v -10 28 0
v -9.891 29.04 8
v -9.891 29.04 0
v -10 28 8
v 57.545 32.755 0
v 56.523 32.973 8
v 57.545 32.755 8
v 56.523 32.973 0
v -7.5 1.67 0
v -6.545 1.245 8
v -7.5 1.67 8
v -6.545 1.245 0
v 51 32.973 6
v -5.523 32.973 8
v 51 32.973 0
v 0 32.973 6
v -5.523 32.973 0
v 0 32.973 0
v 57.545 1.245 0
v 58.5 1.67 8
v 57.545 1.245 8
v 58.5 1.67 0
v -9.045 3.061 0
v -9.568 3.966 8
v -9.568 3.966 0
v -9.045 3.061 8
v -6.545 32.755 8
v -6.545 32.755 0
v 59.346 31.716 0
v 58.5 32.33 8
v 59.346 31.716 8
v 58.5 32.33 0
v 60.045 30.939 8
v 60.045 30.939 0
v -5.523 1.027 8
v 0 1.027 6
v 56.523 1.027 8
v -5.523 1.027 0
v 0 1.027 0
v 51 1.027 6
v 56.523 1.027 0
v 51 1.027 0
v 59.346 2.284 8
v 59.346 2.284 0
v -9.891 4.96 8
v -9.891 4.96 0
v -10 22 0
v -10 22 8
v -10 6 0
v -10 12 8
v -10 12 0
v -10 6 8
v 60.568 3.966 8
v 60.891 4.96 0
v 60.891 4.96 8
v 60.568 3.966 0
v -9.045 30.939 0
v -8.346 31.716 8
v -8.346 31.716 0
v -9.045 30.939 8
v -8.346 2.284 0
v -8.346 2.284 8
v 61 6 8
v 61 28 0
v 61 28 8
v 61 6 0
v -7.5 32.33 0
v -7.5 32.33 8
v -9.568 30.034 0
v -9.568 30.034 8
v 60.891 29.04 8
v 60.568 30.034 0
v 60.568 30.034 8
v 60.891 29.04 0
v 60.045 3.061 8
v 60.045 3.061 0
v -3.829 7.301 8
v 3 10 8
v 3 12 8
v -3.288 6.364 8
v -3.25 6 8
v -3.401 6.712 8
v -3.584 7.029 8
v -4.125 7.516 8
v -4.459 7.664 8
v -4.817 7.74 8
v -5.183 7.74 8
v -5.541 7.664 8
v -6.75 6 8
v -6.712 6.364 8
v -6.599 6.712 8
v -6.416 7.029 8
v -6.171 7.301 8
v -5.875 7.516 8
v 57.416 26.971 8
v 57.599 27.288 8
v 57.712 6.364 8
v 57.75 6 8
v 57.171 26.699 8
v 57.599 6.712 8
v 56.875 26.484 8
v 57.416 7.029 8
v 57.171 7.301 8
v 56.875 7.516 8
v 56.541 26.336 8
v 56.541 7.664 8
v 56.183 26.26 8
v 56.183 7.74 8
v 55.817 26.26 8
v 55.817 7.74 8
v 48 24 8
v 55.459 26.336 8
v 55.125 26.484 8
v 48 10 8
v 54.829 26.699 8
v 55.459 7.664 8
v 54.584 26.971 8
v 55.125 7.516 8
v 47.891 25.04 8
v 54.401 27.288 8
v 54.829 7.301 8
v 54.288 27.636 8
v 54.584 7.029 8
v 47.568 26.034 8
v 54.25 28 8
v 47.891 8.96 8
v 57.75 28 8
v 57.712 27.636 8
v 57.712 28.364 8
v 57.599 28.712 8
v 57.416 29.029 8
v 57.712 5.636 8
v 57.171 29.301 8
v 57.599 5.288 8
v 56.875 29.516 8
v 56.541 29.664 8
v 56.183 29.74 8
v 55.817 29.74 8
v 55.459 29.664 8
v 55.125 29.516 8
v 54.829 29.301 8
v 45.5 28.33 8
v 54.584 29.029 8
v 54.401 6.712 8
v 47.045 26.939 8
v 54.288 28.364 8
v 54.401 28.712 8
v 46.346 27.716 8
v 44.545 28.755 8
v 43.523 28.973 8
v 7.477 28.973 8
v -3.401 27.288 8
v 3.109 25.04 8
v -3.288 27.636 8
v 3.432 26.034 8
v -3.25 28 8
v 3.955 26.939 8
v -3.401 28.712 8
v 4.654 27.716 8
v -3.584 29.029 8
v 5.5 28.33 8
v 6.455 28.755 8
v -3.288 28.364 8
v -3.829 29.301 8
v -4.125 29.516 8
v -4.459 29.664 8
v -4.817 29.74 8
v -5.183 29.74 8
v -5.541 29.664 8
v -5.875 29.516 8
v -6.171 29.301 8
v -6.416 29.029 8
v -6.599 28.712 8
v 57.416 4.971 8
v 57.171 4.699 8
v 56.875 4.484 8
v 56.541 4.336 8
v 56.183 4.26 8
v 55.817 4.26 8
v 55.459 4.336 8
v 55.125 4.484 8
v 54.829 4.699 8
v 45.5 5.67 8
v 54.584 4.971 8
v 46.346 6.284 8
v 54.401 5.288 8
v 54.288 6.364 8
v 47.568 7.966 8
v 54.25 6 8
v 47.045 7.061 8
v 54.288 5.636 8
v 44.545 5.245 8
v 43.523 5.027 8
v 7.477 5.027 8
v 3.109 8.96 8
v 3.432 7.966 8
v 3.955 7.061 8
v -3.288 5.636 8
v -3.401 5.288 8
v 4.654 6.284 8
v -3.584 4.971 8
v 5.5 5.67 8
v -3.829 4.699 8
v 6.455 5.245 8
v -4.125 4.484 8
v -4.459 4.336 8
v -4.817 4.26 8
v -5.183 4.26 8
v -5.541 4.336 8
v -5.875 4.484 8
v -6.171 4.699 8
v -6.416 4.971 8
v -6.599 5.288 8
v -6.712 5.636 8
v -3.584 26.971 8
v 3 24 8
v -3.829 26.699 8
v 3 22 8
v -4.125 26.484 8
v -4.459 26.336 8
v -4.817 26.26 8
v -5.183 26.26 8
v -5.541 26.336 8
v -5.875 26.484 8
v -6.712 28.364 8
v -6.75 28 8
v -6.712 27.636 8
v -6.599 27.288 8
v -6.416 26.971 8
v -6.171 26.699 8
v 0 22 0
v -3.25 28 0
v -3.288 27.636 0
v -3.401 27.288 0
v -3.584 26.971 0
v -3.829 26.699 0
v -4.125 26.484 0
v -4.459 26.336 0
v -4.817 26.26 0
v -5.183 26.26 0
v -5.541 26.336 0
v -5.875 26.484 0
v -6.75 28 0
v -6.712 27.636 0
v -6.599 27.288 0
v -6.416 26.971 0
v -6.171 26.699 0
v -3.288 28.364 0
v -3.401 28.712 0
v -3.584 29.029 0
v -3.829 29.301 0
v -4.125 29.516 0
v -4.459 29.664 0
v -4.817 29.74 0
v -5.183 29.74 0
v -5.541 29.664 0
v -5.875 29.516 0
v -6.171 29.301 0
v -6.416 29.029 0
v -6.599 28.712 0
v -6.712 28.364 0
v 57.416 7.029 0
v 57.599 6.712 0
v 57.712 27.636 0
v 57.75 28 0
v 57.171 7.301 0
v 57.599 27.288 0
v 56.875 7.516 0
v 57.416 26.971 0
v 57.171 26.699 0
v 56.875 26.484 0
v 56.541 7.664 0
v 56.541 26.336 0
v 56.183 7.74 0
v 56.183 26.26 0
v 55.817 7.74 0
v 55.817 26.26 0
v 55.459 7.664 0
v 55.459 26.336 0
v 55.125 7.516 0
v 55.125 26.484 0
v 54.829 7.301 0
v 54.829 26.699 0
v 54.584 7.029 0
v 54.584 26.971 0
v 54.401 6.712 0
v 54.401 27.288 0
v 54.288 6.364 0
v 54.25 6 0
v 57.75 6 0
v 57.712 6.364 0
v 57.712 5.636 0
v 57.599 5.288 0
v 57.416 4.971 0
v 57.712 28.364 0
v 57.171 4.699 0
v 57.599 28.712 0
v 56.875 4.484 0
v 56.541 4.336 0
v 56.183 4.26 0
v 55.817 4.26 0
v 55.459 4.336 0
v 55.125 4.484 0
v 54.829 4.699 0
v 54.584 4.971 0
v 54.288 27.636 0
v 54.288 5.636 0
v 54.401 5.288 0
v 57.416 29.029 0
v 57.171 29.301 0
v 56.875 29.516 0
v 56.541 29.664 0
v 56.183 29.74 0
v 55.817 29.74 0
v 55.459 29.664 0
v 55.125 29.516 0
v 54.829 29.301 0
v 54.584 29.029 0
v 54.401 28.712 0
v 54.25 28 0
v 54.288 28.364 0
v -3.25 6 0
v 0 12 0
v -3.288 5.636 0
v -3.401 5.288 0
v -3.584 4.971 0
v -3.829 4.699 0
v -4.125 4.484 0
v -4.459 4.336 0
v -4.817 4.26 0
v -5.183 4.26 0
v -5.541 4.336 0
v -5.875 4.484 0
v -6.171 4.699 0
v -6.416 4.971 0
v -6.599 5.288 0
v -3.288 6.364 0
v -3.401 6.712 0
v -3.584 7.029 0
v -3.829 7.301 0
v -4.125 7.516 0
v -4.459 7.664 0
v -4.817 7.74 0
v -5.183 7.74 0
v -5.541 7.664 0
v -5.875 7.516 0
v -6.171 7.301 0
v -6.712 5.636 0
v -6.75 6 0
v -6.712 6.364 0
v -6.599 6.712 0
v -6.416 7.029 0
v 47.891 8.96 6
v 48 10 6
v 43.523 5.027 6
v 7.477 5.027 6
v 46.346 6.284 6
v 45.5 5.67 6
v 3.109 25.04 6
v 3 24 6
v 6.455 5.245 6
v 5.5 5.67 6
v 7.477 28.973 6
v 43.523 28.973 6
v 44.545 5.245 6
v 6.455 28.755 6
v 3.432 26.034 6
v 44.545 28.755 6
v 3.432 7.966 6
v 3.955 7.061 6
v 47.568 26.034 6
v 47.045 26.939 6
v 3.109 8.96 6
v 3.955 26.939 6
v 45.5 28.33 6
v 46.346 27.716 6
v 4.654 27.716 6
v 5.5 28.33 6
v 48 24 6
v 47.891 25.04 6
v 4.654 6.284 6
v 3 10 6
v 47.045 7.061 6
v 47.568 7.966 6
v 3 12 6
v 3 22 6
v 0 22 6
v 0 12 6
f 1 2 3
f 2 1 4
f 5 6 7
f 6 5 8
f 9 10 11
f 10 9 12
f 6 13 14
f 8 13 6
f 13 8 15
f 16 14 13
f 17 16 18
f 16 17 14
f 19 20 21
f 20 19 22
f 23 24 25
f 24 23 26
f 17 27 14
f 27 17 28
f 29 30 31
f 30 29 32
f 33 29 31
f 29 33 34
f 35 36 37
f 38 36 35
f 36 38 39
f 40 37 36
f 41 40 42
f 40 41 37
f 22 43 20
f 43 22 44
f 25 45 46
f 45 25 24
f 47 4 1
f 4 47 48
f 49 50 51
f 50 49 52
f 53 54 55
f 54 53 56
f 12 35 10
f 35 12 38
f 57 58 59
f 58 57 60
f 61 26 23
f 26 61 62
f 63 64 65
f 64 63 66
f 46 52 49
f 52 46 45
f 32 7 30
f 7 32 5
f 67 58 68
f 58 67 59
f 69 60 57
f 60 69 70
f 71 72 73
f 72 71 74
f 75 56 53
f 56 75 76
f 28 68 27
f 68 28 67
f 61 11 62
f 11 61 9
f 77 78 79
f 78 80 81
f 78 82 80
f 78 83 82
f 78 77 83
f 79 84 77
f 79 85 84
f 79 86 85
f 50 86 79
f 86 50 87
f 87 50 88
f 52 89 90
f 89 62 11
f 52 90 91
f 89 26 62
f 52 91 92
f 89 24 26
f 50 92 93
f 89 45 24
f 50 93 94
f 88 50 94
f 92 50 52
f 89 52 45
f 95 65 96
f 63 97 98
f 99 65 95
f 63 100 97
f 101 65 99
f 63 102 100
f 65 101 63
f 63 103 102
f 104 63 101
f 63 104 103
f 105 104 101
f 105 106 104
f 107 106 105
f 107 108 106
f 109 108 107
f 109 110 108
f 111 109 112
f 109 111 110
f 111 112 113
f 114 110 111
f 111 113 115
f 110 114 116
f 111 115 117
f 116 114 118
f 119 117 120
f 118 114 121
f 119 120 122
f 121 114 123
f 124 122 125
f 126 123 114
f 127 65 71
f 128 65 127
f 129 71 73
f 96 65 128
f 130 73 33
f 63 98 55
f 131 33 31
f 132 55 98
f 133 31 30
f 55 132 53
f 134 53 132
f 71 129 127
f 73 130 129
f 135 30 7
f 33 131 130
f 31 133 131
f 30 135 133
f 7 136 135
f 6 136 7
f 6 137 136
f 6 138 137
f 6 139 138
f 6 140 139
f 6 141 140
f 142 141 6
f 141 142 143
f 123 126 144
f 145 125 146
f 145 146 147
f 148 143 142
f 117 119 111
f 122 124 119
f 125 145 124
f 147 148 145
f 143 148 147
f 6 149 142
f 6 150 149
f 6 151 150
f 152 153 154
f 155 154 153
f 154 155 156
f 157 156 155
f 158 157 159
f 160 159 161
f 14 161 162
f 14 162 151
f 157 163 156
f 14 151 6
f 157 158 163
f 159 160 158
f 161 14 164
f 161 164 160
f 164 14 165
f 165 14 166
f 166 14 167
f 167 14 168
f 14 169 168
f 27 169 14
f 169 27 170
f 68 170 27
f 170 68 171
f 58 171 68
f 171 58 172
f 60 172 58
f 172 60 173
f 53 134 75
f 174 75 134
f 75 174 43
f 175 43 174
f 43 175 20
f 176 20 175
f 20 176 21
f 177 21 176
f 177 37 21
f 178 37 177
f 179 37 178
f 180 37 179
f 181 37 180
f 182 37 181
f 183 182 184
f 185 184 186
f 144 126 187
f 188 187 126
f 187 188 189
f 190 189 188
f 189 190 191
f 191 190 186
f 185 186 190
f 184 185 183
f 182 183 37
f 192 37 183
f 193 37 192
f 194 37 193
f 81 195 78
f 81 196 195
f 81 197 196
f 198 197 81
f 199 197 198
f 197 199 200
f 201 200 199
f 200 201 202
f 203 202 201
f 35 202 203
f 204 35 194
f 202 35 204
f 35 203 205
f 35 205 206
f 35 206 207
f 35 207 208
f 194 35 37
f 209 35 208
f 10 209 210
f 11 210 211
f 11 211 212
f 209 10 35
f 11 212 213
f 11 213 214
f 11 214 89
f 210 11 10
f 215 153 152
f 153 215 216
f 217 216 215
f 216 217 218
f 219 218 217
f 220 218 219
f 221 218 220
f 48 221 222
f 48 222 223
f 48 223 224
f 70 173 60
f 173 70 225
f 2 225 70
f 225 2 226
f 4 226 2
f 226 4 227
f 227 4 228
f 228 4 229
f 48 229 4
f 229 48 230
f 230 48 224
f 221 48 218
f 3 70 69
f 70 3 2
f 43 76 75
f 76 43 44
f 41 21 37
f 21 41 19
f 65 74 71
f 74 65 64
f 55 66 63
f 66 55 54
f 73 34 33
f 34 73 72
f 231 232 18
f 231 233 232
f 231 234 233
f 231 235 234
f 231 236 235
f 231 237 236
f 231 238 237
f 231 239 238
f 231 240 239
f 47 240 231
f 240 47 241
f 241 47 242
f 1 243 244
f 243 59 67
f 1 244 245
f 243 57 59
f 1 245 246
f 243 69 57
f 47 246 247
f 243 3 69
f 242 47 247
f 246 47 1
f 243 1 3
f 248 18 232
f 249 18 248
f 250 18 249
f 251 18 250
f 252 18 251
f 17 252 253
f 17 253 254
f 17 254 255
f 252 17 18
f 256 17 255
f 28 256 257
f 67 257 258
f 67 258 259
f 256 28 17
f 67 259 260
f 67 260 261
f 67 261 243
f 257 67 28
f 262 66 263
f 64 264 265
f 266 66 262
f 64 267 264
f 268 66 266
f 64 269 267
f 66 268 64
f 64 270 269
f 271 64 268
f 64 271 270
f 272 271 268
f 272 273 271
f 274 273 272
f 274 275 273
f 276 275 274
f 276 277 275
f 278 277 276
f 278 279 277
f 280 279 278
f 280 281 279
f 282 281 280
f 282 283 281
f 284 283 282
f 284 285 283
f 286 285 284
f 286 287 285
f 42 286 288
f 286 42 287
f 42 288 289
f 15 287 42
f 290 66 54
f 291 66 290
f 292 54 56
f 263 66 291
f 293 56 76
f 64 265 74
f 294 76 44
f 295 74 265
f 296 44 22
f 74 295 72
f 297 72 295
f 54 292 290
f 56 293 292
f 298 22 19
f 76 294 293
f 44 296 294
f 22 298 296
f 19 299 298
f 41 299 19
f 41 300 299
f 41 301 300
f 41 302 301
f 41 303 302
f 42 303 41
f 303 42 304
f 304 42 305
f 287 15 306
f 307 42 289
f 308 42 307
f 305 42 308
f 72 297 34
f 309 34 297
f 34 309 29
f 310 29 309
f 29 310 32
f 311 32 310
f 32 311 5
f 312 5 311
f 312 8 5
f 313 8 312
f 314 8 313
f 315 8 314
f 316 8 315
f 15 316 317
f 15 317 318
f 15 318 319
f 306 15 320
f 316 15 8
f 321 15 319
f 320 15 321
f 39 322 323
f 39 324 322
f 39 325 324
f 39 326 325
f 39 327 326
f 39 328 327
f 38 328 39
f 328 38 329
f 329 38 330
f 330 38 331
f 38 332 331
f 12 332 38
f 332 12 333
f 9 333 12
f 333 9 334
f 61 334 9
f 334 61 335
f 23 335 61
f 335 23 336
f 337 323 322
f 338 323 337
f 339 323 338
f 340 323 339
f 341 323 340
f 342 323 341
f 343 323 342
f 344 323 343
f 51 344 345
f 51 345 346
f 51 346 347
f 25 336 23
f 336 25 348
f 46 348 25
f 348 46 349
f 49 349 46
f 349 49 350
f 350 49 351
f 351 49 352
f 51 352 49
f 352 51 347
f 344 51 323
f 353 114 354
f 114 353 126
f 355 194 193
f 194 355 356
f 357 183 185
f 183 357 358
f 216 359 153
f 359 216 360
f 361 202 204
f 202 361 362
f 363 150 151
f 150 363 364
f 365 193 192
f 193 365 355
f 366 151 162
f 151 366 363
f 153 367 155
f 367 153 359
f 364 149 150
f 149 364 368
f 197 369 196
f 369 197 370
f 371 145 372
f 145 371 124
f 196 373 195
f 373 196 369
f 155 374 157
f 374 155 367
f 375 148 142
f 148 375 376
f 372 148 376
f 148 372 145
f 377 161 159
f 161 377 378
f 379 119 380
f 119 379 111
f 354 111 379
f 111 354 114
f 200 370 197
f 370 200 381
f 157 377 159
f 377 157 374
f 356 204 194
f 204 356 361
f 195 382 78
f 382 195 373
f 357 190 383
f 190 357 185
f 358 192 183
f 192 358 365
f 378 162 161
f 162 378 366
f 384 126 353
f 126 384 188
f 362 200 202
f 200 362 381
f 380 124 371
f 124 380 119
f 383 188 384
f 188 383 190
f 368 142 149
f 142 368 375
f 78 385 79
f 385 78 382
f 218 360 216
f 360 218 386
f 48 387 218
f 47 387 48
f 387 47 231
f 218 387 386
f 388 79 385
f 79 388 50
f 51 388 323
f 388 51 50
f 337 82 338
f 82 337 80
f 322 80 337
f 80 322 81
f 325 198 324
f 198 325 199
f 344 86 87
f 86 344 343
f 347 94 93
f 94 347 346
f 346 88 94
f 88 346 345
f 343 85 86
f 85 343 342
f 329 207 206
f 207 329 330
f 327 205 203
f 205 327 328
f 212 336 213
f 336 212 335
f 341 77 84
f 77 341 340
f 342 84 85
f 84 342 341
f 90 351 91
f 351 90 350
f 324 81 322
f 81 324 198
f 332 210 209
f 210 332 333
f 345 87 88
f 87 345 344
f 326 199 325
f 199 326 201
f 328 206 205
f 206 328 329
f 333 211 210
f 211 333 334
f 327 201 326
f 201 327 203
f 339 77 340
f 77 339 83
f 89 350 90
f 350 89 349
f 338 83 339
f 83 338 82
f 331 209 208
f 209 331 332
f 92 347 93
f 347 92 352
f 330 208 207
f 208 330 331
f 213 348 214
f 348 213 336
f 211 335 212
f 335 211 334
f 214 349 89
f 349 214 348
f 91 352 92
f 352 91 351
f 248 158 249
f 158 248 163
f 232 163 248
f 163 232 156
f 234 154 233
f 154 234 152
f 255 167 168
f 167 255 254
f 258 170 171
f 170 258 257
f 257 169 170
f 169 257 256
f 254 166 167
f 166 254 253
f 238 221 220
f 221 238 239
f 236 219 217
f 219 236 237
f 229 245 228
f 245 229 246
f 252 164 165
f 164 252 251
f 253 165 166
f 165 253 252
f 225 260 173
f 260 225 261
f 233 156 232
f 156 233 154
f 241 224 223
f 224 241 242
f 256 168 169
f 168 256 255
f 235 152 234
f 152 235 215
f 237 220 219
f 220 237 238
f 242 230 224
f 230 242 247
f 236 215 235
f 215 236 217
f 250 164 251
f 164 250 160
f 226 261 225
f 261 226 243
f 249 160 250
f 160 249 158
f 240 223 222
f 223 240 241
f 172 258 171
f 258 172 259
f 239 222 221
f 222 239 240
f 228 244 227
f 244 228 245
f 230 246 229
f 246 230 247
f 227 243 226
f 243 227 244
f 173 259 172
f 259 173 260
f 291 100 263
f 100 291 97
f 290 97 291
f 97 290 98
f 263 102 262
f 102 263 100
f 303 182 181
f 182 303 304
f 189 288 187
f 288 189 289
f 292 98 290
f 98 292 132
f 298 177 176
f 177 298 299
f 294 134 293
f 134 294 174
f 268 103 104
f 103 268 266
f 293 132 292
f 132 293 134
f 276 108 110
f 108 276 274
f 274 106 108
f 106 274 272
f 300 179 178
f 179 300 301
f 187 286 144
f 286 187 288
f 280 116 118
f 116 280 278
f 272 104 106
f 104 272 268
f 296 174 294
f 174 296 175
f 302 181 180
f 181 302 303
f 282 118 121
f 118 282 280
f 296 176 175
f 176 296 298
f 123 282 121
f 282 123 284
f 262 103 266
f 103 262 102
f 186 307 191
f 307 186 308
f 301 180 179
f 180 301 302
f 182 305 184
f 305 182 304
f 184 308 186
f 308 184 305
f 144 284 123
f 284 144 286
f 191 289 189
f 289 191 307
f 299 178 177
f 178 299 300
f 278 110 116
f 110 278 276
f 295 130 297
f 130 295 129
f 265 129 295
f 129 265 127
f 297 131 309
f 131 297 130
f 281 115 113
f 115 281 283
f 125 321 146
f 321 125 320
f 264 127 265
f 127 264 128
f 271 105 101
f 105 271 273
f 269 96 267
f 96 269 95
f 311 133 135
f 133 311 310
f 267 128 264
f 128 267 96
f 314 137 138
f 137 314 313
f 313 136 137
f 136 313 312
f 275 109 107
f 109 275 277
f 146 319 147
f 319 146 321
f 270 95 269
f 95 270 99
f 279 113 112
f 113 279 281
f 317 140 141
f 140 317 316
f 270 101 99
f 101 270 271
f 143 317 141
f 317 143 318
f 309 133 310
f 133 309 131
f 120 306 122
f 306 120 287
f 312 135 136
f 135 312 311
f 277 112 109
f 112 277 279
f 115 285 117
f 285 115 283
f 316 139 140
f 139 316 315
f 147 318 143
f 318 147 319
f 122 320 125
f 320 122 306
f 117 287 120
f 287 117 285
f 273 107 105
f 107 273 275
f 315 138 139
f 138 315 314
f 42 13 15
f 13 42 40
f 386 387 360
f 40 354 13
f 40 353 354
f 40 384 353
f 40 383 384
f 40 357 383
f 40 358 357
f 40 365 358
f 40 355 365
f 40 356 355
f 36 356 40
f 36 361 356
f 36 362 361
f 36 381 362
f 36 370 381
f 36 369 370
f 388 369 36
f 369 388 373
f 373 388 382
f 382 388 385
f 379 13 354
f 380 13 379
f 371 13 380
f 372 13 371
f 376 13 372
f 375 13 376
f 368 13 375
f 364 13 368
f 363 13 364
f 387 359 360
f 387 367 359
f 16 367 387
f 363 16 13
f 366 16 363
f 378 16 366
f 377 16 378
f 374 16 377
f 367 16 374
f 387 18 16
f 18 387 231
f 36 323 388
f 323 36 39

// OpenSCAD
$fn=30;

//bat();

h=6;
w=34;
l=51;

module bat()color([1,0,0])cube([l,w,h]);



difference() {
  union() {
    hull(){
      translate([-5,6,0])cylinder(r=5,h=h+2);
      translate([-5,w-6,0])cylinder(r=5,h=h+2);
      translate([l+5,6,0])cylinder(r=5,h=h+2);
      translate([l+5,w-6,0])cylinder(r=5,h=h+2);
    }
  }
  hull(){
    translate([8,10,0])cylinder(r=5,h=h+4);
    translate([8,w-10,0])cylinder(r=5,h=h+4);
    translate([l-8,10,0])cylinder(r=5,h=h+4);
    translate([l-8,w-10,0])cylinder(r=5,h=h+4);
  }
  translate([0,w/2,h/2])cube([40,10,h*22], center=true);

  translate([-5,6,-1])cylinder(r=3.5/2,h=h+4);
  translate([-5,w-6,-1])cylinder(r=3.5/2,h=h+4);
  translate([l+5,6,-1])cylinder(r=3.5/2,h=h+4);
  translate([l+5,w-6,-1])cylinder(r=3.5/2,h=h+4);
  
  bat();
}
